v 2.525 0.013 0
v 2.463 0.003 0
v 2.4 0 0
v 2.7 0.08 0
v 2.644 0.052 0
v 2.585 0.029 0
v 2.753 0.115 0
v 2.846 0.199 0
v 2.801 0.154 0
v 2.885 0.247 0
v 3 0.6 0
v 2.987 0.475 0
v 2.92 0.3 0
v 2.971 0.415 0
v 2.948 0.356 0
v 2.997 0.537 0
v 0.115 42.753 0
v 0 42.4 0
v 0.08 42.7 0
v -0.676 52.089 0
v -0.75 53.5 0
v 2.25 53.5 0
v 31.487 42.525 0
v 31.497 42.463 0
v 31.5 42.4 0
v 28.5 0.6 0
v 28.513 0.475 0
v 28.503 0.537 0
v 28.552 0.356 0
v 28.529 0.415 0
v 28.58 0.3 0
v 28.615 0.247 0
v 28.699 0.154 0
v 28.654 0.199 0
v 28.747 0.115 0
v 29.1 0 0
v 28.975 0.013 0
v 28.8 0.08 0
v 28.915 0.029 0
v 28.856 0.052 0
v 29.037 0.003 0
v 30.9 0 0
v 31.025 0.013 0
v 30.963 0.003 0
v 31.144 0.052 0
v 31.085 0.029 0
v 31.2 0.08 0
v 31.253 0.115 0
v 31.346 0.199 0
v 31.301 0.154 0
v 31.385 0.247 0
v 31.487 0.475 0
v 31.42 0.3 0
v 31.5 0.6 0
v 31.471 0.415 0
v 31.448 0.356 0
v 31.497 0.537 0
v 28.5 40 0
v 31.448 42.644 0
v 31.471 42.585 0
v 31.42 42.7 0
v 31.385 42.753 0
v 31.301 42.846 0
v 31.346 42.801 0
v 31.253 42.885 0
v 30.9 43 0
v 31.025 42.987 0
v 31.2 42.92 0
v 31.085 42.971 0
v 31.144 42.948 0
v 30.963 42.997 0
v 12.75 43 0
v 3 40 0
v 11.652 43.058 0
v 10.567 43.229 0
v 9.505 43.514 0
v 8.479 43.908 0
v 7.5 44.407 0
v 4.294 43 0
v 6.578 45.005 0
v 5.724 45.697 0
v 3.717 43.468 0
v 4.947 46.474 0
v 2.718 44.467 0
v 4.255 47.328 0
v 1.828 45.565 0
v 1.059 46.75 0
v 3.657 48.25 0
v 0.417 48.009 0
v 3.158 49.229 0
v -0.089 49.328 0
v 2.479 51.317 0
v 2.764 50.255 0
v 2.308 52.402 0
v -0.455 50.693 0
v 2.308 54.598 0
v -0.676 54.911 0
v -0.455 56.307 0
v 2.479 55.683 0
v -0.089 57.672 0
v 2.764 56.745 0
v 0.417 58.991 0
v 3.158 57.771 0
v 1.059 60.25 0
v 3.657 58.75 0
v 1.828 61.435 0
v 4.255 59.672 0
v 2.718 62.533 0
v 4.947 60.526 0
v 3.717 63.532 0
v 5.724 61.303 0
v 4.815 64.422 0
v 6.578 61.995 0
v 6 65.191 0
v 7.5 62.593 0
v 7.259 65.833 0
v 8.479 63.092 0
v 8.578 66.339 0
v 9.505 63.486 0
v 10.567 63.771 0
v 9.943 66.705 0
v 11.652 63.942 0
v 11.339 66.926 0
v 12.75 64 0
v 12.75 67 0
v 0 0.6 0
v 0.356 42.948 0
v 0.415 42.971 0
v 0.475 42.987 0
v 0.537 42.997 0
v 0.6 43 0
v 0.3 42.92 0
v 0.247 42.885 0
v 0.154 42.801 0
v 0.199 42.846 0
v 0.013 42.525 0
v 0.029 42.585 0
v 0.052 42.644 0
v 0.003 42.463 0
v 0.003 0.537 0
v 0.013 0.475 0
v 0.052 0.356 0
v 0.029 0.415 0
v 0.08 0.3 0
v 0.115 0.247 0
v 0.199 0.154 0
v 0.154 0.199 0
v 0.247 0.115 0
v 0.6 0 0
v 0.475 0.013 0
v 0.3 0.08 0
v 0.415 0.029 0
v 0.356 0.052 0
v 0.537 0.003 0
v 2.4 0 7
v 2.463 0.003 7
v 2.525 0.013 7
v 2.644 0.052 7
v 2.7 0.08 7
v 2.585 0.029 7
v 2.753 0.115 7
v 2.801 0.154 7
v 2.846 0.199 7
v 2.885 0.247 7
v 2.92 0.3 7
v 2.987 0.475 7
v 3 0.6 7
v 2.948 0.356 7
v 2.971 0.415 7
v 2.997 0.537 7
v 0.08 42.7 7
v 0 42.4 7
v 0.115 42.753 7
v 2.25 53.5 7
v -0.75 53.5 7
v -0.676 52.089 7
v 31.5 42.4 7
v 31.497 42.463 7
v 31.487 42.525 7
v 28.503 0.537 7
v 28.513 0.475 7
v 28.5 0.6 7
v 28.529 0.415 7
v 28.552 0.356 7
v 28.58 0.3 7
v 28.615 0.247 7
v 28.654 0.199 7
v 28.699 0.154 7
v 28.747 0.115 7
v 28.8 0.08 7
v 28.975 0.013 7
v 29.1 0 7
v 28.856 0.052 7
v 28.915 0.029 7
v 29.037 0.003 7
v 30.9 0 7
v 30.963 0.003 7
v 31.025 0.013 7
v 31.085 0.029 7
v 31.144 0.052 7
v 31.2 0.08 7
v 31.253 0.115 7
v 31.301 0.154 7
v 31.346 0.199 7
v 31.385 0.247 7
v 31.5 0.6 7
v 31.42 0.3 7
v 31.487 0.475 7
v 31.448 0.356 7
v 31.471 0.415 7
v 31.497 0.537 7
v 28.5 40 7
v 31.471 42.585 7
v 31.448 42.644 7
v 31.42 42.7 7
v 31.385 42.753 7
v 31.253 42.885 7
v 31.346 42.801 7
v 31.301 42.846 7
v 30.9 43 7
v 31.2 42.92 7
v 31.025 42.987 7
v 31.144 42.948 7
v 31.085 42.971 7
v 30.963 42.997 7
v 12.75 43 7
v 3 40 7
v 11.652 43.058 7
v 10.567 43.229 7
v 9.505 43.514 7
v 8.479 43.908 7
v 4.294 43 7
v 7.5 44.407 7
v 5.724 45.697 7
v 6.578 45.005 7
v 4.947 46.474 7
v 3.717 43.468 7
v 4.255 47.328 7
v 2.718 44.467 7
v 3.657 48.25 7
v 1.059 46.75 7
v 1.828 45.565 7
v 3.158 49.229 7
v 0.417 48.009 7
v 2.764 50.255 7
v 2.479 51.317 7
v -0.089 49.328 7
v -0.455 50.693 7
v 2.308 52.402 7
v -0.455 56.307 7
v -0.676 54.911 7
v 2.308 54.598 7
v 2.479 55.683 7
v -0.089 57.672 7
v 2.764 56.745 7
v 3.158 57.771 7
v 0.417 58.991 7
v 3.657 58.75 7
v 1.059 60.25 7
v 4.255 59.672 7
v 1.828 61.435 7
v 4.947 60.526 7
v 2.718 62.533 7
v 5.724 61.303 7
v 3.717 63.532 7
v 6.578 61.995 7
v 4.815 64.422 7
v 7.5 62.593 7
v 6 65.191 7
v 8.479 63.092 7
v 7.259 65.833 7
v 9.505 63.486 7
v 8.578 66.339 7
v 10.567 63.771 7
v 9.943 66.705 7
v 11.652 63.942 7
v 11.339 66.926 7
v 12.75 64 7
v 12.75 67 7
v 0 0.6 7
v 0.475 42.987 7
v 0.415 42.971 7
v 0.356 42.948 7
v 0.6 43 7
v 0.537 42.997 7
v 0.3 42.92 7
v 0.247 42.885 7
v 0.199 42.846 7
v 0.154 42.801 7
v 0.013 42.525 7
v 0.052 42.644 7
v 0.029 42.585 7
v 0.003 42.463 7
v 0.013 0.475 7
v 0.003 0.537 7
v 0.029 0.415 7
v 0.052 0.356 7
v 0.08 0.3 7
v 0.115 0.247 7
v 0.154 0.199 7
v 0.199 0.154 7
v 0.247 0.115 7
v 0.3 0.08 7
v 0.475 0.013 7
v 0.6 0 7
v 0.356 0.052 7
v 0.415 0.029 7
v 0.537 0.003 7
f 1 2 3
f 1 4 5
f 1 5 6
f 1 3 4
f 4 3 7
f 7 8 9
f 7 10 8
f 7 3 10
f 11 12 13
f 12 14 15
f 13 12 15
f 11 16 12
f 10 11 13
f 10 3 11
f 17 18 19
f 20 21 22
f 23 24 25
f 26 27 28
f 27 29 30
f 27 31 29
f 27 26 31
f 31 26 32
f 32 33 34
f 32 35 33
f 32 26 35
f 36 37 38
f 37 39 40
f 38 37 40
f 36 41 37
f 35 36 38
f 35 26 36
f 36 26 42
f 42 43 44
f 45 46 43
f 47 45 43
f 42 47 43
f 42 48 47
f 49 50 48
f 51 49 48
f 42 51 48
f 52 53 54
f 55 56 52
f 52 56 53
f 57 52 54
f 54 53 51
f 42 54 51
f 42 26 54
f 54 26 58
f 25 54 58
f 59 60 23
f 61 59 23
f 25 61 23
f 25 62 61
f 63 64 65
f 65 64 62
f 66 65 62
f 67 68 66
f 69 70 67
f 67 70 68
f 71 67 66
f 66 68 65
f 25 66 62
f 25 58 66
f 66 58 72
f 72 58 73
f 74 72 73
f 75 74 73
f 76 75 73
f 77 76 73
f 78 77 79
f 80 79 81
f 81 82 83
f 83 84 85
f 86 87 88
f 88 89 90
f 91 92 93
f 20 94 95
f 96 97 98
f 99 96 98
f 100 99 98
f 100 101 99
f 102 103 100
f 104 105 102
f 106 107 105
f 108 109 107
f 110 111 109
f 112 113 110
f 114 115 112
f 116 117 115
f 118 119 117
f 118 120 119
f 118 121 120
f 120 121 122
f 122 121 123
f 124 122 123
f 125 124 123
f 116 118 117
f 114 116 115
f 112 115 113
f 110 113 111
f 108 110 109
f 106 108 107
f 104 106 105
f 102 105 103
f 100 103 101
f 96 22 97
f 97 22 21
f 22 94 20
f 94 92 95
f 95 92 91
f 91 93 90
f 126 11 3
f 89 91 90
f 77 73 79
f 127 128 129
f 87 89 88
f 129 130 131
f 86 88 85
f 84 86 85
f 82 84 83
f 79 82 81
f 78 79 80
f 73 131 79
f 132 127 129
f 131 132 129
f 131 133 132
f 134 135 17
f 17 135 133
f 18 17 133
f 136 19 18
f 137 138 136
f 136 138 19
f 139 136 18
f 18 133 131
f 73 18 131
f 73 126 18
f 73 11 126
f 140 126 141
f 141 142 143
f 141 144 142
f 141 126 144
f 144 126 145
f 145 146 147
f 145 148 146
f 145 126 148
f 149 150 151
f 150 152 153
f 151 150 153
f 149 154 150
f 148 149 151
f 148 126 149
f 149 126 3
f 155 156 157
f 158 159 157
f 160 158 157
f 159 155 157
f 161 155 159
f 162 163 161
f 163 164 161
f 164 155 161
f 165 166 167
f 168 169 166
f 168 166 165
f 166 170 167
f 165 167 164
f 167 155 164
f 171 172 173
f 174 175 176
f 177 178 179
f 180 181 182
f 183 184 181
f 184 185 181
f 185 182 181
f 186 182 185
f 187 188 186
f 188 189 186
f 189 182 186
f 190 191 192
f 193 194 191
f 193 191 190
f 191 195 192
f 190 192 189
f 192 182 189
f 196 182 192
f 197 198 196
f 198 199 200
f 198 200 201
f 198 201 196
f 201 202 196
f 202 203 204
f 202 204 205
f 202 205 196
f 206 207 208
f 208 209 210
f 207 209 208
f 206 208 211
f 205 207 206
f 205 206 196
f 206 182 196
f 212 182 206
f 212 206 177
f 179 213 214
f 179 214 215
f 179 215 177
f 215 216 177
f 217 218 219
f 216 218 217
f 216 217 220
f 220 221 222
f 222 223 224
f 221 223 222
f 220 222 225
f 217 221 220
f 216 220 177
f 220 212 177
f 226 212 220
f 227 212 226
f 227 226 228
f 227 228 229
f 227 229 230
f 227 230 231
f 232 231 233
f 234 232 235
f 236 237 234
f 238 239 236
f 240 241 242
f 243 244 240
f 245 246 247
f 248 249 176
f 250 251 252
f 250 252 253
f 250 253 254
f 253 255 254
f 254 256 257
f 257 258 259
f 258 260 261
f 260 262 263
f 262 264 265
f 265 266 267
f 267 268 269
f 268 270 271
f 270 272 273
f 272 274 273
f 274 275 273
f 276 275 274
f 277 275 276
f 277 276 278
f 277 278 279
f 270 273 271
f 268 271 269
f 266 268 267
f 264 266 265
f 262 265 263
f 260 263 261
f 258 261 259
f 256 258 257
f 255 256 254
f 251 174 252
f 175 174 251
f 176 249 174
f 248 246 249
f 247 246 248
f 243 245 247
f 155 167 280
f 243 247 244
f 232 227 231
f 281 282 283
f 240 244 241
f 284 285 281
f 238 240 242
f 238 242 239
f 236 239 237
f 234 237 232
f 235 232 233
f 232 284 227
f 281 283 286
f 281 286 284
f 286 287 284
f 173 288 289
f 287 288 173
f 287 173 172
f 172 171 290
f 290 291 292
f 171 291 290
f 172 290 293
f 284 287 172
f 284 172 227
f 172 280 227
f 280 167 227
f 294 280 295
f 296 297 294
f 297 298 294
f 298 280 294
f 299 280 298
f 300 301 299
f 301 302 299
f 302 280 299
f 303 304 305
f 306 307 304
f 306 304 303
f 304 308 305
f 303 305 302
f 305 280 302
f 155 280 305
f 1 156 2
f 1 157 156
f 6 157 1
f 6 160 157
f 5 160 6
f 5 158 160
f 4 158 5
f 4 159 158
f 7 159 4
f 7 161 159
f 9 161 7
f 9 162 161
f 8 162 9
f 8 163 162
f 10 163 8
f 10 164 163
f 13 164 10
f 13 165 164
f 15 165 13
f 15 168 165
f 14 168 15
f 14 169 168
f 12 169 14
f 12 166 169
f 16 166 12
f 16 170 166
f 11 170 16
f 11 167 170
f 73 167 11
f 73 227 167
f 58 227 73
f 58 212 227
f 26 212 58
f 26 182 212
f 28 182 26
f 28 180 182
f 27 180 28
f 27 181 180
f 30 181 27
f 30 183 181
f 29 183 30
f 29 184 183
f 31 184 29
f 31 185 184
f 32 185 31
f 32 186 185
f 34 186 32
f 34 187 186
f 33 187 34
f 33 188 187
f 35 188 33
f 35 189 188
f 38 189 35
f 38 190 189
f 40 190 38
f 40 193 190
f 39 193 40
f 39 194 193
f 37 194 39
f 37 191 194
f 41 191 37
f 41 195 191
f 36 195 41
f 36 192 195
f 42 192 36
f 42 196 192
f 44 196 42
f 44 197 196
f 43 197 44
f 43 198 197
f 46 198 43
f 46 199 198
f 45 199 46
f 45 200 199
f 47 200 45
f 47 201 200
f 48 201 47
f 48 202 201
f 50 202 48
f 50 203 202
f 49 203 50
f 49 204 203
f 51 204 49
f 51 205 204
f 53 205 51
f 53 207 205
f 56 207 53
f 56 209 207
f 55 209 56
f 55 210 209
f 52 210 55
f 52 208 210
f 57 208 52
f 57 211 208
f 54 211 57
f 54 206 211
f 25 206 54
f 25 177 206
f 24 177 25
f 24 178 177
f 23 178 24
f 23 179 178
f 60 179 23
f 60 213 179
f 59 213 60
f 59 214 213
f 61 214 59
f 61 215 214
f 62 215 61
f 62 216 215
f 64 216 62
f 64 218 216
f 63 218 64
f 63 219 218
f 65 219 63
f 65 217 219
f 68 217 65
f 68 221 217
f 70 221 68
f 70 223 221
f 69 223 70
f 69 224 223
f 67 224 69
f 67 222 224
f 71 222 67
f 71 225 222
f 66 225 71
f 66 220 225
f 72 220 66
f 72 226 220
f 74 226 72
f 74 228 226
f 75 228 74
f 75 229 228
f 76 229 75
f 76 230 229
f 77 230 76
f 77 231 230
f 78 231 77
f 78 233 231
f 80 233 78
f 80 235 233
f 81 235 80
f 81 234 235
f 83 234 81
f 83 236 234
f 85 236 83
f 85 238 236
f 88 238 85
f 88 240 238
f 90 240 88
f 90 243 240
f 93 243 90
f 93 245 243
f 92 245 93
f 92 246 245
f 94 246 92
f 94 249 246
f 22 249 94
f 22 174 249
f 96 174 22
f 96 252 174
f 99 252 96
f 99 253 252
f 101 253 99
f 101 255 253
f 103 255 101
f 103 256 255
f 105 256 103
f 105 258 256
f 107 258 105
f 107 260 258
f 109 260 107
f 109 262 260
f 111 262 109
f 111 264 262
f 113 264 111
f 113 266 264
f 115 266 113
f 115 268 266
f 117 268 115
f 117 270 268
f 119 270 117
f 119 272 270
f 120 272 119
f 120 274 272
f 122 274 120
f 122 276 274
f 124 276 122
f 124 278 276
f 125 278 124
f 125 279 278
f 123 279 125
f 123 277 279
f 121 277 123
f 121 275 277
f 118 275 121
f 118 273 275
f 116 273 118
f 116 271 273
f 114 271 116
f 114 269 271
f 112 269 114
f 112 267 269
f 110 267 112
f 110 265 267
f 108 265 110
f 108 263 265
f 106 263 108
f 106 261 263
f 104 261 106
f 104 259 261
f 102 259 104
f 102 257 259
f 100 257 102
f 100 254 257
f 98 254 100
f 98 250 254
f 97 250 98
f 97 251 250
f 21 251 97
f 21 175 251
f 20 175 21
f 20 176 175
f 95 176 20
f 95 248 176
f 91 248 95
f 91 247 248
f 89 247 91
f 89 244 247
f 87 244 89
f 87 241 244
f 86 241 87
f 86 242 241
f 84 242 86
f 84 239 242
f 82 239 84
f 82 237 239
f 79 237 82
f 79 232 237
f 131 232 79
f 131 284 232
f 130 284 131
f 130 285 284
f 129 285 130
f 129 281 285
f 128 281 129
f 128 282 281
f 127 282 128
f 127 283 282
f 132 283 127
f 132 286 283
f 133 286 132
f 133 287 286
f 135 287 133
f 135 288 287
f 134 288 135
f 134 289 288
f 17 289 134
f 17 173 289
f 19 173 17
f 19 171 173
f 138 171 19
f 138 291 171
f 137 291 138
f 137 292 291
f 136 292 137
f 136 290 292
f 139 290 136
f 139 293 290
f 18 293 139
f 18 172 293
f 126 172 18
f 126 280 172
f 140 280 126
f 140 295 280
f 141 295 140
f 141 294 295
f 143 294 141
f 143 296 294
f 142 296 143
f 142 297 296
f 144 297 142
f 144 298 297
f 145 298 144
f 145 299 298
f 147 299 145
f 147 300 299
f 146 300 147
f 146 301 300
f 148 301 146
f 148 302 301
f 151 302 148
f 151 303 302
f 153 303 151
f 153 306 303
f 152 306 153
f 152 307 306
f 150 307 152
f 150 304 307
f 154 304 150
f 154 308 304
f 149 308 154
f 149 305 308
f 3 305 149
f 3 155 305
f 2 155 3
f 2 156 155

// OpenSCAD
$fn=60;
// Measurements assumed as mm

// Internal measurement: bottom of 'leg' to top of arch
loop_length=40;
// Internal measurement: distance between legs desk is 31
loop_height=25.5; 

////
//Customisable options:
////

// Internal measurement: distance onto the desk the hook goes
loop_length=40;//[20:50]

// Internal measurement: gap between arch and hook lip. 5 for small hook, 21 for headset
hook_depth=21;//[1:40]

// Internal measurement: height of hook lip above semi circle. 2.5 recommended
hook_height=2.5;//[0:25]

// Print height from bed
print_height=7;//[1:15]

// Horizontal thickness of 2d shape
pla_width=3;//[2:5]



linear_extrude(height=print_height){
    deskhook(loop_length, loop_height, pla_width, hook_depth, hook_height);
};

 
module deskhook(loop_length, loop_height, pla_width, hook_depth, hook_height){
    union(){
        loop(loop_length, loop_height, pla_width);
        translate([loop_height/2, loop_length+pla_width+hook_depth/2])rotate([0,0,270])semi_arc(hook_depth/2, pla_width);
    }
}


// The "U" shaped part of the hook that slots over the desk
module loop(height, width, depth){
    union(){
      // Main U shape
        rounded_square(depth, height+depth);
        translate([0,height])rounded_square((2*depth + width), depth);
        translate([width+depth,0])rounded_square(depth, height+depth);
    }
}

    
// Produces a rectangle with rounded corners, starting at [0,0]
// Rounding has to be based on the smaller dimension, so we don't draw a square with negative sides
module rounded_square(width, length){
    rounding= width>length ? length*0.2 : width*0.2;
    translate([rounding, rounding])
    minkowski(){
        square([width-(2*rounding), length-(2*rounding)]);
        circle(rounding);
    }
}

// Semicircle. Go figure
module semicircle(radius){
difference(){
    circle(r=radius);
    translate([-radius,0])square(2*radius);
    }
}

// Cuts one semi-circle with another, to produce an arc
module semi_arc(radius, width){
    difference(){
    semicircle(radius+width);
    circle(r=radius);
    }
}
